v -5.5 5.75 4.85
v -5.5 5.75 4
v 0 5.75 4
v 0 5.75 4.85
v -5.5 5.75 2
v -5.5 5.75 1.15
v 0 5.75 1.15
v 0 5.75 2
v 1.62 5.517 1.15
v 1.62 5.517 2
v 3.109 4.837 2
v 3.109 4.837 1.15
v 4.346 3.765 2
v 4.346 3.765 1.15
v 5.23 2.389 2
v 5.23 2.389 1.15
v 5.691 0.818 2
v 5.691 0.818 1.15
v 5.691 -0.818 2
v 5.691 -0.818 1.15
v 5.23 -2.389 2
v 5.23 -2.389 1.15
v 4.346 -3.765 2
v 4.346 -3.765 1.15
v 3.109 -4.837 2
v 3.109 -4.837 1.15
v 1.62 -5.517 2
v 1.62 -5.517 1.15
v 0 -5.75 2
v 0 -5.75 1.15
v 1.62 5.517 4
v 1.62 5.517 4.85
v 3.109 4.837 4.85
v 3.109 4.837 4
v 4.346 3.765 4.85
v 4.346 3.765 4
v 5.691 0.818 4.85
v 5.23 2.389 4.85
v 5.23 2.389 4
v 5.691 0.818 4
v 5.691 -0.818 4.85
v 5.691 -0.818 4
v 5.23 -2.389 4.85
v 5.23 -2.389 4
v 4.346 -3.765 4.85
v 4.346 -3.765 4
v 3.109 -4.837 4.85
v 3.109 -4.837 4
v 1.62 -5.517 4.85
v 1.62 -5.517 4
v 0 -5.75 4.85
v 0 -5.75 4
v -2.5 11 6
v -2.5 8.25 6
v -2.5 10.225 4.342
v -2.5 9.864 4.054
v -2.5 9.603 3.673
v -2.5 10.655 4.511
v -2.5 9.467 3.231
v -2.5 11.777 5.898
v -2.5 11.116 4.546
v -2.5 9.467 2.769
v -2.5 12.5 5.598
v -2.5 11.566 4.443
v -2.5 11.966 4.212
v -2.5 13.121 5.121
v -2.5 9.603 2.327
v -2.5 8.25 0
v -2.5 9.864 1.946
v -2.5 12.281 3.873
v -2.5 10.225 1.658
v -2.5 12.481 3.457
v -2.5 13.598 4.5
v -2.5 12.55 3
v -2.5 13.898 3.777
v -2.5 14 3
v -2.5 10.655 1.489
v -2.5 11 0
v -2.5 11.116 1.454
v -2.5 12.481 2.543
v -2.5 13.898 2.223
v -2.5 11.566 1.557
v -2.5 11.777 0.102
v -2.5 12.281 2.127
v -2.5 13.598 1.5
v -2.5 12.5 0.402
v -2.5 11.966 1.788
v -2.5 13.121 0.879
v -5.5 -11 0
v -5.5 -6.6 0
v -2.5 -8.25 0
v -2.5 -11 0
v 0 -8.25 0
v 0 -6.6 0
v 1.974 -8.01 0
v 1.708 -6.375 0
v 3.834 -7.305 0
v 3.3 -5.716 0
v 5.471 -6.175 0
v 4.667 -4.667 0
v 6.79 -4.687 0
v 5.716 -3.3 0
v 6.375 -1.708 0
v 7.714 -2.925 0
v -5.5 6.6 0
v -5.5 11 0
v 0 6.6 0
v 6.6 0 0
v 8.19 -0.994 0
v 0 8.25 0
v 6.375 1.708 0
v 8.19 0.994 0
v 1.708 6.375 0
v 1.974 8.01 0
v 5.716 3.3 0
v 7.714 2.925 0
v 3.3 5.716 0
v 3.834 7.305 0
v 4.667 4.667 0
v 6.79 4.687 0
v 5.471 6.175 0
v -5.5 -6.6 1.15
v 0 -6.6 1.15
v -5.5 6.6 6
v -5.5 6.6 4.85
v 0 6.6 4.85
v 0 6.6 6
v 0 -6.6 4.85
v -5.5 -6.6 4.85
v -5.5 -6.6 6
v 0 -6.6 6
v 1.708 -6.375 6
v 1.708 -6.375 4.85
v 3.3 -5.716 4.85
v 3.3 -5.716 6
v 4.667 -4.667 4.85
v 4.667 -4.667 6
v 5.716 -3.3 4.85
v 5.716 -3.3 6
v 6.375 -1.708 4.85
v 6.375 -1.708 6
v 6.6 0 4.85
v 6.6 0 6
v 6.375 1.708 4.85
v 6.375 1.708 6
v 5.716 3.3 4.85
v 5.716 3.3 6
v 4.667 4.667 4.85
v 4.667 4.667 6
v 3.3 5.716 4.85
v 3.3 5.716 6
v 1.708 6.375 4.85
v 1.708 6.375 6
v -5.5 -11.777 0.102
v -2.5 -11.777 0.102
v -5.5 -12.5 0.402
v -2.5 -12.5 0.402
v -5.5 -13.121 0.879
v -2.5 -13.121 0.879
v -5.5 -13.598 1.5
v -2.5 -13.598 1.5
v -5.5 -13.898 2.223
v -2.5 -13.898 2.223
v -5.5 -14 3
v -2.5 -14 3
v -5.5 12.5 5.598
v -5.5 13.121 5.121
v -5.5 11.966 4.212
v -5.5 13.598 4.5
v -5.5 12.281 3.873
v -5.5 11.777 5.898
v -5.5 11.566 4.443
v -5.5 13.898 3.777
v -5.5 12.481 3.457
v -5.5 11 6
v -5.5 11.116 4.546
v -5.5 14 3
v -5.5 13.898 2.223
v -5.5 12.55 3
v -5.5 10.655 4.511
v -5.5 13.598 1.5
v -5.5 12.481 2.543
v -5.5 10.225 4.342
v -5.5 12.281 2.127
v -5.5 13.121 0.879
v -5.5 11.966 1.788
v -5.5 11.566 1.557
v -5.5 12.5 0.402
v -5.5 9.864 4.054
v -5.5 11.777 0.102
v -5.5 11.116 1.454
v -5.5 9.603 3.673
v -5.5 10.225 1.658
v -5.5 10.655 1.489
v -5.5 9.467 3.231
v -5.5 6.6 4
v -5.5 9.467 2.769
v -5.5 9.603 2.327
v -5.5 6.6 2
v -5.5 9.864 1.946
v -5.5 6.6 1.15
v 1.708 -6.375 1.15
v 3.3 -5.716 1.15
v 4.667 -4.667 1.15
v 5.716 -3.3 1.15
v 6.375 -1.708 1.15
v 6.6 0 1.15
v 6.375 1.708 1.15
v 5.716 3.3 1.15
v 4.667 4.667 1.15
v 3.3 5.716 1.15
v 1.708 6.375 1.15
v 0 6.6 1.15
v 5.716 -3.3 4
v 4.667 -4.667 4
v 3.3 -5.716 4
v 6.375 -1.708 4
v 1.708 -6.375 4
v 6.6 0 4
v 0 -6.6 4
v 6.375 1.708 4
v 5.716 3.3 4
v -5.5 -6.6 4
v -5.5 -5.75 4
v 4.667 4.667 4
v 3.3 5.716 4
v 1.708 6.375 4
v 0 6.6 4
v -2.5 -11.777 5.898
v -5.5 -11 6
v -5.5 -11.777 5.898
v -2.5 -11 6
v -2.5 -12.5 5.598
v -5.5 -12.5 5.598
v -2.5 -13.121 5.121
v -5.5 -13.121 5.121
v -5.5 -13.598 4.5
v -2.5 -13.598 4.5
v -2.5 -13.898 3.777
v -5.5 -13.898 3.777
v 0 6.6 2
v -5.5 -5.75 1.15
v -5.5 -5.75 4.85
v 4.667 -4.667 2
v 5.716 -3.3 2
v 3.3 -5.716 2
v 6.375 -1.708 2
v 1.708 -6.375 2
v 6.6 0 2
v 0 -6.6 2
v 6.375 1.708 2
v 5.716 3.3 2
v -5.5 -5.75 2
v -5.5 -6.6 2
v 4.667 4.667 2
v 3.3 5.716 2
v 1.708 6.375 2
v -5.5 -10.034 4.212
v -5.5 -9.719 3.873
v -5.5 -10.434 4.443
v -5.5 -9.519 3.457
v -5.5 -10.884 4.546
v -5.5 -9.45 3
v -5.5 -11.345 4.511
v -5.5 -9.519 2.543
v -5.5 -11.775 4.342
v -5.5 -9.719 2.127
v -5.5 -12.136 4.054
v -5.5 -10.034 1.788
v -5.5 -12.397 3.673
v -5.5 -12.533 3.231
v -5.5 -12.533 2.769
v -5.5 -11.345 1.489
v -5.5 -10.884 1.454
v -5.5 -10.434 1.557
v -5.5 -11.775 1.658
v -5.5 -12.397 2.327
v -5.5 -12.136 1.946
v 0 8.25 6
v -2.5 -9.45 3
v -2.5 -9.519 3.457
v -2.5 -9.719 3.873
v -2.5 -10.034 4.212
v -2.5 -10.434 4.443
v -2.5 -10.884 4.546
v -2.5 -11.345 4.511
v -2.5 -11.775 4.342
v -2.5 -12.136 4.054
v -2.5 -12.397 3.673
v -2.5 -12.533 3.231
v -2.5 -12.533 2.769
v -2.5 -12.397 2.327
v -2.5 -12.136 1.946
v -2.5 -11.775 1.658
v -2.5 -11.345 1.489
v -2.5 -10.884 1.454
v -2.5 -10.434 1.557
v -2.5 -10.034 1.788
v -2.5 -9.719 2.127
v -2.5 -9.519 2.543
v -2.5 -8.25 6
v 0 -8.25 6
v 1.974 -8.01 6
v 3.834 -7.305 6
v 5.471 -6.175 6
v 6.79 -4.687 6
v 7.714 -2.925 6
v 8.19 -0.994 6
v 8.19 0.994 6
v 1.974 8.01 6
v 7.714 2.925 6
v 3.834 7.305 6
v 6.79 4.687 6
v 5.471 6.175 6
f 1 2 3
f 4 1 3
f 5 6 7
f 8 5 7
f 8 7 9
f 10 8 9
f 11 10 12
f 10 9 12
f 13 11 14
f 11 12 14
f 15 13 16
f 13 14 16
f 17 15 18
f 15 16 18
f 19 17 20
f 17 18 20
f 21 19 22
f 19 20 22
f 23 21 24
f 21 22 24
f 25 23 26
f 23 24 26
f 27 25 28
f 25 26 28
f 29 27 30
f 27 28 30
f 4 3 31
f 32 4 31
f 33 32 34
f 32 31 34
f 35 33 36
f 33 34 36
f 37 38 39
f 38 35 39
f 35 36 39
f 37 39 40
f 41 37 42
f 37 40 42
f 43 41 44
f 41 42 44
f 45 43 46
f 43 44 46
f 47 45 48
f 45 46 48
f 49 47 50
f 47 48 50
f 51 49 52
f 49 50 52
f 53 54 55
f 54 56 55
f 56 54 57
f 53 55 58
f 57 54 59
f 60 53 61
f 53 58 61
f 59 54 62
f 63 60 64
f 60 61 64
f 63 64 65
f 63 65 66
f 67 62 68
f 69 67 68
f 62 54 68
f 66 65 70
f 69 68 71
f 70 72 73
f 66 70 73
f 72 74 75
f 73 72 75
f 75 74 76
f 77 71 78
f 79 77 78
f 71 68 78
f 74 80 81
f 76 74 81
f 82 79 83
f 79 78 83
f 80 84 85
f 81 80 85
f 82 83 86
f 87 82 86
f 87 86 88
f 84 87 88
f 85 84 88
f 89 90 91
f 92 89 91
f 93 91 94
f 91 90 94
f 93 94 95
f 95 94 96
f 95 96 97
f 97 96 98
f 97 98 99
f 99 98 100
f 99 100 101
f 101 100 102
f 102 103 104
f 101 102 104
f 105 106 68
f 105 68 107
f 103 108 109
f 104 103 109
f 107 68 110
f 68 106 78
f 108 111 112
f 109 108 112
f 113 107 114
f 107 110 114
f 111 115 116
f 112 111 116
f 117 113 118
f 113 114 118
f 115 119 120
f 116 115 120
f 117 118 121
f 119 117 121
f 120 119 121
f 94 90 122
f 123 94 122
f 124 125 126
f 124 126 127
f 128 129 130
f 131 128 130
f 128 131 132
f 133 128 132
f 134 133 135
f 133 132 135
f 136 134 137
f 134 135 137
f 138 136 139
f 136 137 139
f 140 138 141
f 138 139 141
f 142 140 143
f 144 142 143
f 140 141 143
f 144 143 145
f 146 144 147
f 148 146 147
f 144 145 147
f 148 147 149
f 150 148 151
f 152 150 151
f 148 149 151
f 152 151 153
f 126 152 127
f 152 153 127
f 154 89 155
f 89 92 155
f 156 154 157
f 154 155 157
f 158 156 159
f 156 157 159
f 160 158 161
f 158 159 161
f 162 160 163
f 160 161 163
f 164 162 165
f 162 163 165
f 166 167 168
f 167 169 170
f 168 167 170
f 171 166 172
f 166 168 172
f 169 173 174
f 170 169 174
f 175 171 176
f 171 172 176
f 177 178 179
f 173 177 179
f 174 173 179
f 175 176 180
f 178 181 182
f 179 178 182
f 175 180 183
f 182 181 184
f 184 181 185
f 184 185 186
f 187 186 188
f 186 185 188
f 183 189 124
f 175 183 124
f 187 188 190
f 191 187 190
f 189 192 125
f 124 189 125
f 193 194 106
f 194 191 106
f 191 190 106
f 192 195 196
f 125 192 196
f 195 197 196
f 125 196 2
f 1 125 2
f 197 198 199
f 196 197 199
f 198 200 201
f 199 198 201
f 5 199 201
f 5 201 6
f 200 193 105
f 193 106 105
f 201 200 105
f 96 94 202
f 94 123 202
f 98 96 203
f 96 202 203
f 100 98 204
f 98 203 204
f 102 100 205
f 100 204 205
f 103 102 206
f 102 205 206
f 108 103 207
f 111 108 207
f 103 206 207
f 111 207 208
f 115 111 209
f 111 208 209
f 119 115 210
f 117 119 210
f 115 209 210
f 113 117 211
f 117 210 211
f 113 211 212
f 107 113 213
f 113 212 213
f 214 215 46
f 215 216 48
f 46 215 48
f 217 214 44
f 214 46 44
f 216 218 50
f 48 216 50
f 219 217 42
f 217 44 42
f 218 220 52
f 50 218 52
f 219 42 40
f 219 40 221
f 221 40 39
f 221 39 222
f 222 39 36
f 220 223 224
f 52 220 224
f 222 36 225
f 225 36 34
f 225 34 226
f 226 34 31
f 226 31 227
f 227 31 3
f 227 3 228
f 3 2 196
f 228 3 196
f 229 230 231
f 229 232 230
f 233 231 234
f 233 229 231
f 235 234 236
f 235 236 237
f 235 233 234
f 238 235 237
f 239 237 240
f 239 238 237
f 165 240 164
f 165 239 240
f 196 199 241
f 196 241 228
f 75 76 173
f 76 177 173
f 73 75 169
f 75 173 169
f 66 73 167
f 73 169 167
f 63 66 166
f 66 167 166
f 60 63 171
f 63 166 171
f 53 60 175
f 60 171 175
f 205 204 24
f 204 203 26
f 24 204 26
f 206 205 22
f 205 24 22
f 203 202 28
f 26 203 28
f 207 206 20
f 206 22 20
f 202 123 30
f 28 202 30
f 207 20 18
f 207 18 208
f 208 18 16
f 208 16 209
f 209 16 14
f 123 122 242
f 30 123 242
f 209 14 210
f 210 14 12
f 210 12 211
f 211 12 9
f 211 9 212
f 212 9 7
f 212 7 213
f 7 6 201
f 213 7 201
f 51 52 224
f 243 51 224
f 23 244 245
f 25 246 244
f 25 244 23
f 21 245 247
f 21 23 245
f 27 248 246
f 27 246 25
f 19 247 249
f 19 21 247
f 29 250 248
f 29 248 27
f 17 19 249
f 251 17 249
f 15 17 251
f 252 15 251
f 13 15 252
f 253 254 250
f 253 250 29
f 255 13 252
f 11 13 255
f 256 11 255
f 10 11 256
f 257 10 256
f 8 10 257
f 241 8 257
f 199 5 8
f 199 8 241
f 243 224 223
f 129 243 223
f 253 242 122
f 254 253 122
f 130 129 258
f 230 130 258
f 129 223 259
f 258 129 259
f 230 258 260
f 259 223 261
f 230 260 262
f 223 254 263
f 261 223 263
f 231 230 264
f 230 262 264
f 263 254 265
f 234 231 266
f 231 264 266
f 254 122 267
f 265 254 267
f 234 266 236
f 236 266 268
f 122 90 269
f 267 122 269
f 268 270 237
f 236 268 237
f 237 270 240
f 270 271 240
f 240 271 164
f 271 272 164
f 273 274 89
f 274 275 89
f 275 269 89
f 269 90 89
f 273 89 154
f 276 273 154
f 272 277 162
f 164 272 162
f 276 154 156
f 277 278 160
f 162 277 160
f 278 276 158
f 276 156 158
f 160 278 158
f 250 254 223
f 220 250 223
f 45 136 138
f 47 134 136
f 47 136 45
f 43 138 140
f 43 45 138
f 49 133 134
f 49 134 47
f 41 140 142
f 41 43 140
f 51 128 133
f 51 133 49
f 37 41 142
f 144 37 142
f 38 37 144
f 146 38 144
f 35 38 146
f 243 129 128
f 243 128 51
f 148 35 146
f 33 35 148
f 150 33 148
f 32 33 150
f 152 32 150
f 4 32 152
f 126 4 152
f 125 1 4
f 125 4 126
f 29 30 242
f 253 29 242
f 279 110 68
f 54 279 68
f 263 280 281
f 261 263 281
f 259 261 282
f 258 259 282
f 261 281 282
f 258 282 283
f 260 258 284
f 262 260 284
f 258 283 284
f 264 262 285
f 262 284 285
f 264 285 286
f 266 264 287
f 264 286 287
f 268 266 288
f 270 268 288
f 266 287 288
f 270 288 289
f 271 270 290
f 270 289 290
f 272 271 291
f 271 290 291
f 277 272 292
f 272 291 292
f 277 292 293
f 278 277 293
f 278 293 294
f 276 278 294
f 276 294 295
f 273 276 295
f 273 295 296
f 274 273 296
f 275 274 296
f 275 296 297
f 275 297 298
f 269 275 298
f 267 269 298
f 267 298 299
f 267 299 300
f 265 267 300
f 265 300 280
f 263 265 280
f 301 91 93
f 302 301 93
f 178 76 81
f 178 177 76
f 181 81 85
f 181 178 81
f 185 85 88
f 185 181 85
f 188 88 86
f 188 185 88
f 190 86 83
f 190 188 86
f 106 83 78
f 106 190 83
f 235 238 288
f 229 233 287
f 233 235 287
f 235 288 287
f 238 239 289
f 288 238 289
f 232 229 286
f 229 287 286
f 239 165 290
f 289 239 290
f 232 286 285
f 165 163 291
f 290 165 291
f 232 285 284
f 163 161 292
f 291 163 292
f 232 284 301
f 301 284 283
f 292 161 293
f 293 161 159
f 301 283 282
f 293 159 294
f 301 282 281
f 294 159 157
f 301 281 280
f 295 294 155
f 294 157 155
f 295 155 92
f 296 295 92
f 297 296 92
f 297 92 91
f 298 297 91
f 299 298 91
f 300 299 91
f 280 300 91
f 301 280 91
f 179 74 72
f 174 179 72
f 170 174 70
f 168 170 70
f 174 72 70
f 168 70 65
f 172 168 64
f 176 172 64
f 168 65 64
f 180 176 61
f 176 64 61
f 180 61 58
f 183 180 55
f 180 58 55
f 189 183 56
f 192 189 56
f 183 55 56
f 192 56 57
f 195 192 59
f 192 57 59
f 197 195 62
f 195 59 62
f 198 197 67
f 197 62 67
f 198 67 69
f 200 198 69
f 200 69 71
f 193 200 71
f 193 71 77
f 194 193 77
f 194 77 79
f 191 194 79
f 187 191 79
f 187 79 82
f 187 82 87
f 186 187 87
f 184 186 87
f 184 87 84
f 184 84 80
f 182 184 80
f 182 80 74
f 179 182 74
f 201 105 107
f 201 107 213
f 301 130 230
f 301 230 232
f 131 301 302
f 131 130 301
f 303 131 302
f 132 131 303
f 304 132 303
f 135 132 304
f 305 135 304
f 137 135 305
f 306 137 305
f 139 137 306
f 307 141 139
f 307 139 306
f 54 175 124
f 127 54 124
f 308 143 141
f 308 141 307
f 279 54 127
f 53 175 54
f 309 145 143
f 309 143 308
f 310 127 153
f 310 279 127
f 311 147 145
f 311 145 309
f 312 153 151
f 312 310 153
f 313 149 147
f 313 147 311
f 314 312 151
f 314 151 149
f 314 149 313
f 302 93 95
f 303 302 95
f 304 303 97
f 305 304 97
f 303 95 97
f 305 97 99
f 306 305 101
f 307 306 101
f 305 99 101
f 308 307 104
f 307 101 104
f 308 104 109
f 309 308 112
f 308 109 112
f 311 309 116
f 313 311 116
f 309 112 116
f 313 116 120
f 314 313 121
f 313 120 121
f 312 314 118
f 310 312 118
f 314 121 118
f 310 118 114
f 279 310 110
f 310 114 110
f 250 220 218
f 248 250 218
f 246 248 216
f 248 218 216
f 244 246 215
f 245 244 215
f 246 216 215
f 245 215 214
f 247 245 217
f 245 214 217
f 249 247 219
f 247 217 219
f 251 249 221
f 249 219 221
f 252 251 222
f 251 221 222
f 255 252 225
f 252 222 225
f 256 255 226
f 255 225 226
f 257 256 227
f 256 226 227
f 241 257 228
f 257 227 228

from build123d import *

# Parameters (mm, degrees)
EXTRUDE_1_DEPTH     = 6
SKETCH_2_R          = 1.55
CUT_EXTRUDE_1_DEPTH = 6
FILLET_2_R          = 3
SKETCH_3_W          = 2
SKETCH_3_H          = 0.85
CUT_EXTRUDE_2_DEPTH = 5.5
SKETCH_4_W          = 1.15
SKETCH_4_H          = 0.85
SKETCH_4_W_2        = 2


with BuildPart() as part:
    # 草图1 → 凸台-拉伸1 (new body)
    with BuildSketch(Plane.XY):
        with BuildLine():
            Line((-5.5, 14), (-5.5, 5.75))
            Line((-5.5, 5.75), (0, 5.75))
            ThreePointArc((0, 5.75), (5.75, 0), (0, -5.75))
            Line((0, -5.75), (-5.5, -5.75))
            Line((-5.5, -5.75), (-5.5, -14))
            Line((-5.5, -14), (-2.5, -14))
            Line((-2.5, -14), (-2.5, -8.25))
            Line((-2.5, -8.25), (0, -8.25))
            ThreePointArc((0, -8.25), (8.25, 0), (0, 8.25))
            Line((0, 8.25), (-2.5, 8.25))
            Line((-2.5, 8.25), (-2.5, 14))
            Line((-2.5, 14), (-5.5, 14))
        make_face()
    extrude(amount=EXTRUDE_1_DEPTH)

    # 草图2 → 切除-拉伸1 (cut)
    with BuildSketch(Plane(origin=(-2.5, 0, 0), x_dir=(0, 0, -1), z_dir=(1, 0, 0))):
        with Locations(Location((-3, -11, 0), (0, 0, 90))):
            Circle(SKETCH_2_R)
        with Locations(Location((-3, 11, 0), (0, 0, 90))):
            Circle(SKETCH_2_R)
    extrude(amount=-CUT_EXTRUDE_1_DEPTH, mode=Mode.SUBTRACT)

    # 圆角2
    fillet_2_edges = [part.edges().sort_by_distance(p)[0] for p in [
        (-4, -14, 0),
        (-4, -14, 6),
        (-4, 14, 0),
        (-4, 14, 6),
    ]]
    fillet(fillet_2_edges, radius=FILLET_2_R - 0.0001)  # a hair under: the kernel refuses the full size

    # 草图3 → 切除-拉伸2 (cut)
    with BuildSketch(Plane.ZY.offset(5.5)):
        with Locations((0.15, 6.175)):
            Rectangle(SKETCH_3_W, SKETCH_3_H)
        with Locations((3, 6.175)):
            Rectangle(SKETCH_3_W, SKETCH_3_H)
        with Locations((5.85, -6.175)):
            Rectangle(SKETCH_3_W, SKETCH_3_H)
        with Locations((5.85, 6.175)):
            Rectangle(SKETCH_3_W, SKETCH_3_H)
        with Locations((3, -6.175)):
            Rectangle(SKETCH_3_W, SKETCH_3_H)
        with Locations((0.15, -6.175)):
            Rectangle(SKETCH_3_W, SKETCH_3_H)
    extrude(amount=-CUT_EXTRUDE_2_DEPTH, mode=Mode.SUBTRACT)

    # 草图4 → 切除-旋转1 (revolve, cut)
    with BuildSketch(Plane.ZY):
        with Locations((5.425, 6.175)):
            Rectangle(SKETCH_4_W, SKETCH_4_H)
        with Locations((3, 6.175)):
            Rectangle(SKETCH_4_W_2, SKETCH_4_H)
        with Locations((0.575, 6.175)):
            Rectangle(SKETCH_4_W, SKETCH_4_H)
    revolve(axis=Axis((0, 0, 0), (0, 0, 1)), mode=Mode.SUBTRACT)


solid = part.part
